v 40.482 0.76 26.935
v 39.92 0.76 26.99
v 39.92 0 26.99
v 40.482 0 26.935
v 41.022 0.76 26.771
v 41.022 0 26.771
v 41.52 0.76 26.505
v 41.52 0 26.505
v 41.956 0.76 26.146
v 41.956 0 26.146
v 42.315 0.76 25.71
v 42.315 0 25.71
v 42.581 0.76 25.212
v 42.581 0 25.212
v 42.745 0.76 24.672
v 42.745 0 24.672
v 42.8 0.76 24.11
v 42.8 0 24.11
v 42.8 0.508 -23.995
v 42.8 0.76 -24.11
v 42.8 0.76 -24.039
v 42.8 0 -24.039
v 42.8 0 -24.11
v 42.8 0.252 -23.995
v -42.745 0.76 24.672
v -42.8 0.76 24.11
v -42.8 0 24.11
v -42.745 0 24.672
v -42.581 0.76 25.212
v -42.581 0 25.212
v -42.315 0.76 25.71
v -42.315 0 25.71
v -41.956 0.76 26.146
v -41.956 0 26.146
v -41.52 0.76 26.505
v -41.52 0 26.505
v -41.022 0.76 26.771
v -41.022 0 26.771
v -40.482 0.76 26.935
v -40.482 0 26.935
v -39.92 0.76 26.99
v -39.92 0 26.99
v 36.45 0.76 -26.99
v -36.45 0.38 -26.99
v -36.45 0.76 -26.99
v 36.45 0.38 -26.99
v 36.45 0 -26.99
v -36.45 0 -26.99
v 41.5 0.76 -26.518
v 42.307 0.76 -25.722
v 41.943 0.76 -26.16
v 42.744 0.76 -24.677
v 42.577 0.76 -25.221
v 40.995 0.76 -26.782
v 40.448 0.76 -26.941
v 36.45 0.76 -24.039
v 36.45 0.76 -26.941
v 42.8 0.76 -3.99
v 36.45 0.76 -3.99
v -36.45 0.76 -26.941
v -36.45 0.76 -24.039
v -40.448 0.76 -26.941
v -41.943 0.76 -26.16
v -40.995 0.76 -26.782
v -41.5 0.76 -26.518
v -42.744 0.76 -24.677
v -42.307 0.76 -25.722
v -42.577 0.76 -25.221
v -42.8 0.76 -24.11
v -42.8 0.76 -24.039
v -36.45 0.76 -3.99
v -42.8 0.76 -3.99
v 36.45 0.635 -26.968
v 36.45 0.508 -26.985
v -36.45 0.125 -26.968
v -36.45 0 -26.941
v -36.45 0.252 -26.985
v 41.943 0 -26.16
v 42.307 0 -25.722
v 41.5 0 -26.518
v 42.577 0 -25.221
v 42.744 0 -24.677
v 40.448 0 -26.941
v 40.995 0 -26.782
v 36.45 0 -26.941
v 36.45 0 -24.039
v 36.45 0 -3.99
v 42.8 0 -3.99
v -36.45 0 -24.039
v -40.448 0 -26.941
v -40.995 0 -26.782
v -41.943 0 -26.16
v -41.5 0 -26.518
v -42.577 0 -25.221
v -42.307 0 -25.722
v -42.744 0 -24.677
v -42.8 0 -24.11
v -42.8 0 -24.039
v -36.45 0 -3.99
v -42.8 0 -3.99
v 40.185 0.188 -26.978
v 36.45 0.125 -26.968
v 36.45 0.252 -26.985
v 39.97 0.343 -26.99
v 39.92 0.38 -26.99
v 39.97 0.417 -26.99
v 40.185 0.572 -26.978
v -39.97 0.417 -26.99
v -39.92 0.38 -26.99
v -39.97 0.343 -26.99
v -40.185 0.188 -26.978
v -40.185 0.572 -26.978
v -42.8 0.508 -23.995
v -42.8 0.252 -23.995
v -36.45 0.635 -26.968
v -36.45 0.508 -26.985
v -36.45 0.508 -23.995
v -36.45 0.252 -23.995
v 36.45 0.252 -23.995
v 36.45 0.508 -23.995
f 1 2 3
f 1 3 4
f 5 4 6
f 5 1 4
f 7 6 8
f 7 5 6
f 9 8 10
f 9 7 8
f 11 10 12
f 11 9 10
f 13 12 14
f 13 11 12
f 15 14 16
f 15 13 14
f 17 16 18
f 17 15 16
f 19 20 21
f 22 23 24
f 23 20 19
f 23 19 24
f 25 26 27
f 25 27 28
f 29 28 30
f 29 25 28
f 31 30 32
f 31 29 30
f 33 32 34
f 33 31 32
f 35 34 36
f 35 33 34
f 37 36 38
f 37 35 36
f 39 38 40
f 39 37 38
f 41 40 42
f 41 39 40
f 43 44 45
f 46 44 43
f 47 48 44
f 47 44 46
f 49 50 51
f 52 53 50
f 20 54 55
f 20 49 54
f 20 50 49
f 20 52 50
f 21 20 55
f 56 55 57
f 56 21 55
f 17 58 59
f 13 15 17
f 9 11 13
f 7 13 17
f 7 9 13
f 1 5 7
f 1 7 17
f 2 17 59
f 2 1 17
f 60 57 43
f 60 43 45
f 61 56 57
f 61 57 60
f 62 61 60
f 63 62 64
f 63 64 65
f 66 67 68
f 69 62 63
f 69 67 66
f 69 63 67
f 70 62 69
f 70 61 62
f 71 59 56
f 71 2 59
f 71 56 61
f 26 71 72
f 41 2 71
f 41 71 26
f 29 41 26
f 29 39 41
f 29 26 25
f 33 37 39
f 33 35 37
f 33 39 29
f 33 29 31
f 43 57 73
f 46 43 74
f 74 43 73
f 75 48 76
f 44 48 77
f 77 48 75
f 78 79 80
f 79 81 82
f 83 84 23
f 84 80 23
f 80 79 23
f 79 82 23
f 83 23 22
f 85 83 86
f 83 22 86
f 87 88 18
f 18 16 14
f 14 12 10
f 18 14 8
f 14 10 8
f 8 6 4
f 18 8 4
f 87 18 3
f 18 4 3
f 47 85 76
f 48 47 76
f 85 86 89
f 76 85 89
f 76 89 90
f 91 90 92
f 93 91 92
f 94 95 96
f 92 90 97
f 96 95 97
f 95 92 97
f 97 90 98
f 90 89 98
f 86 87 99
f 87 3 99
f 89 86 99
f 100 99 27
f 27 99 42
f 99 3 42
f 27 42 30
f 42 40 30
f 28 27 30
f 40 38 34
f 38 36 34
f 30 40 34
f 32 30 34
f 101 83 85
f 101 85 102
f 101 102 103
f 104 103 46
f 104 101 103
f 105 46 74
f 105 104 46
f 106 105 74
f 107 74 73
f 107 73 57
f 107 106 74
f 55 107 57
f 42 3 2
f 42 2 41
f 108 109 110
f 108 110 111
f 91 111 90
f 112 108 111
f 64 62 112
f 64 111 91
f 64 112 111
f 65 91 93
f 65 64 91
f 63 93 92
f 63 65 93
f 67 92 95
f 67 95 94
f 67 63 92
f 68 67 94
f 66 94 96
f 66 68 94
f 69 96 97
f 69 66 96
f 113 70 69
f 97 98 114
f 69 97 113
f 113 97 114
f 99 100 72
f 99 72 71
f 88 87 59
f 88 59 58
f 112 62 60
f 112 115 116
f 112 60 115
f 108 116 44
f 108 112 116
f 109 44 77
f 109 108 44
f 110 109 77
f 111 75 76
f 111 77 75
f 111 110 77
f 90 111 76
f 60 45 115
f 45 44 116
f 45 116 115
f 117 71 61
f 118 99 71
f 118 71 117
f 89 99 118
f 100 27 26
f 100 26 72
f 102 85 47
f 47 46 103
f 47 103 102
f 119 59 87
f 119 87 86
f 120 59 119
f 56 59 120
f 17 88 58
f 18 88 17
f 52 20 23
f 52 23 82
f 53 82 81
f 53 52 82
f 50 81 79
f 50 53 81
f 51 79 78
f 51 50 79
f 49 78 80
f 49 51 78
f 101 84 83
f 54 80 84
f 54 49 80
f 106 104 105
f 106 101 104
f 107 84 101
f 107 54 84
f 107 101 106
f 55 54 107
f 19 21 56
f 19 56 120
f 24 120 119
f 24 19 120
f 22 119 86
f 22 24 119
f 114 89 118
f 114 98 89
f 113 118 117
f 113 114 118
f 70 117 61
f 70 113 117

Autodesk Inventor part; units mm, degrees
ref_plane "YZ Plane" through (0, 0, 0) normal (1, 0, 0) x (0, 1, 0)
ref_plane "XZ Plane" through (0, 0, 0) normal (0, 1, 0) x (-1, 0, 0)
ref_plane "XY Plane" through (0, 0, 0) normal (0, 0, 1) x (1, 0, 0)
sketch "Sketch1" plane through (0, 0, 0) normal (0, 1, 0) x (-1, 0, 0)
  line L0 (42.8, -26.99) -> (-42.8, -26.99)
  line L1 (-42.8, -26.99) -> (-42.8, 26.99)
  line L2 (-42.8, 26.99) -> (42.8, 26.99)
  line L3 (42.8, 26.99) -> (42.8, -26.99)
  line L4 (42.8, -26.99) -> (-42.8, 26.99) construction
  line L5 (-42.8, -26.99) -> (42.8, 26.99) construction
  point P0 (0, 0)
  dimension "d0" = 85.6
  dimension "d1" = 53.98
extrude "Extrusion1" add sketch "Sketch1" along normal blind 0.76
fillet "Fillet1" radius 2.88 4 edges at (42.8, 0.38, 26.99) (42.8, 0.38, -26.99) (-42.8, 0.38, 26.99) (-42.8, 0.38, -26.99)
sketch "Sketch2" plane through (0, 0, 0) normal (0, -1, 0) x (1, 0, 0)
  arc A0 (-42.8, -24.11) -> (-39.92, -26.99) centre (-39.92, -24.11) ccw projected
  line L0 (-39.92, -26.99) -> (39.92, -26.99) projected
  arc A1 (39.92, -26.99) -> (42.8, -24.11) centre (39.92, -24.11) ccw projected
  line L1 (42.8, -24.11) -> (42.8, 24.11) projected
  arc A2 (42.8, 24.11) -> (39.92, 26.99) centre (39.92, 24.11) ccw projected
  line L2 (39.92, 26.99) -> (-39.92, 26.99) projected
  arc A3 (-39.92, 26.99) -> (-42.8, 24.11) centre (-39.92, 24.11) ccw projected
  line L3 (-42.8, 24.11) -> (-42.8, -24.11) projected
  line L4 (-42.8, 24.11) -> (-42.8, -24.11) projected
  line L5 (-42.8, -3.99) -> (-36.45, -3.99)
  line L6 (-36.45, -3.99) -> (-36.45, -23.99)
  line L7 (-36.45, -23.99) -> (-42.8, -23.99)
  line L8 (-42.8, -23.99) -> (-42.8, -3.99)
  line L9 (42.8, 24.11) -> (42.8, -24.11) projected
  line L10 (42.8, -23.99) -> (36.45, -23.99)
  line L11 (36.45, -23.99) -> (36.45, -3.99)
  line L12 (36.45, -3.99) -> (42.8, -3.99)
  line L13 (42.8, -3.99) -> (42.8, -23.99)
  point P0 (0, 0)
  dimension "d5" = 6.35
  dimension "d6" = 6.35
  dimension "d7" = 3
  dimension "d8" = 3
  dimension "d9" = 20
  dimension "d10" = 20
extrude "Extrusion2" cut sketch "Sketch2" against normal through all contours L3 L5 L6 L7 | L10 L11 L12 L1
sketch "Sketch3" plane through (42.8, 0, 24.11) normal (1, 0, 0) x (0, 0, -1)
  line L0 (51.1, 0) -> (51.1, 0.76) projected
  line L1 (51.1, 0) -> (51.1, 0.76)
  line L2 (48.1, 0.76) -> (48.1, 0)
  line L3 (48.1, 0) -> (51.1, 0.76) construction
  line L4 (51.1, 0) -> (48.1, 0.76) construction
  line L5 (51.1, 0) -> (48.22, 0) projected
  arc A0 (48.1489, 0.76) -> (48.1489, 0) centre (49.6, 0.38) ccw
  arc A1 (51.0511, 0) -> (51.0511, 0.76) centre (49.6, 0.38) ccw
  line L6 (48.1, 0) -> (48.1489, 0)
  line L7 (51.0511, 0) -> (51.1, 0)
  line L8 (51.1, 0.76) -> (51.0511, 0.76)
  line L9 (48.1489, 0.76) -> (48.1, 0.76)
  point P0 (24.11, 0)
  point P1 (48.1, 0.38)
  point P2 (51.1, 0.38)
  dimension "d14" = 3
  dimension "d15" = 0.76
  dimension "d16" = 1.5
  dimension "d17" = 1.5
  dimension "d18" = 1.5
extrude "Extrusion3" cut sketch "Sketch3" against normal up to surface (6.35 mm away)
mirror "Mirror1" about plane through (0, 0, 0) normal (1, 0, 0) of "Extrusion3"
equation "\"d0\" = cardWidth"
equation "\"d1\" = cardHeight"
equation "\"d2\" = cardThickness"
equation "\"d4\" = cardFillet"
equation "\"d5\" = materialThickness"
equation "\"d6\" = materialThickness"
equation "\"d7\" = cardPinDiameter"
equation "\"d8\" = cardPinDiameter"
equation "\"d9\" = cardCutoutHeight"
equation "\"d10\" = cardCutoutHeight"
equation "\"d11\" = cardThickness"
equation "\"d14\" = cardPinDiameter"
equation "\"d15\" = cardThickness"
equation "\"d16\" = 0.5 * cardPinDiameter"
equation "\"d18\" = 0.5 * cardPinDiameter"
equation "\"d19\" = cardThickness"
equation "\"materialThickness\" = 6.35"
equation "\"laserKerf\" = 0.1"
equation "\"cardPinDiameter\" = 3"
equation "\"centeralShaftDiameter\" = 6"
equation "\"cardWidth\" = 85.6"
equation "\"cardHeight\" = 53.98"
equation "\"cardThickness\" = 0.76"
equation "\"cardFillet\" = 2.88"
equation "\"cardCutoutHeight\" = 20"
equation "\"d13\" = cardPinDiameter"
properties part number "card"
